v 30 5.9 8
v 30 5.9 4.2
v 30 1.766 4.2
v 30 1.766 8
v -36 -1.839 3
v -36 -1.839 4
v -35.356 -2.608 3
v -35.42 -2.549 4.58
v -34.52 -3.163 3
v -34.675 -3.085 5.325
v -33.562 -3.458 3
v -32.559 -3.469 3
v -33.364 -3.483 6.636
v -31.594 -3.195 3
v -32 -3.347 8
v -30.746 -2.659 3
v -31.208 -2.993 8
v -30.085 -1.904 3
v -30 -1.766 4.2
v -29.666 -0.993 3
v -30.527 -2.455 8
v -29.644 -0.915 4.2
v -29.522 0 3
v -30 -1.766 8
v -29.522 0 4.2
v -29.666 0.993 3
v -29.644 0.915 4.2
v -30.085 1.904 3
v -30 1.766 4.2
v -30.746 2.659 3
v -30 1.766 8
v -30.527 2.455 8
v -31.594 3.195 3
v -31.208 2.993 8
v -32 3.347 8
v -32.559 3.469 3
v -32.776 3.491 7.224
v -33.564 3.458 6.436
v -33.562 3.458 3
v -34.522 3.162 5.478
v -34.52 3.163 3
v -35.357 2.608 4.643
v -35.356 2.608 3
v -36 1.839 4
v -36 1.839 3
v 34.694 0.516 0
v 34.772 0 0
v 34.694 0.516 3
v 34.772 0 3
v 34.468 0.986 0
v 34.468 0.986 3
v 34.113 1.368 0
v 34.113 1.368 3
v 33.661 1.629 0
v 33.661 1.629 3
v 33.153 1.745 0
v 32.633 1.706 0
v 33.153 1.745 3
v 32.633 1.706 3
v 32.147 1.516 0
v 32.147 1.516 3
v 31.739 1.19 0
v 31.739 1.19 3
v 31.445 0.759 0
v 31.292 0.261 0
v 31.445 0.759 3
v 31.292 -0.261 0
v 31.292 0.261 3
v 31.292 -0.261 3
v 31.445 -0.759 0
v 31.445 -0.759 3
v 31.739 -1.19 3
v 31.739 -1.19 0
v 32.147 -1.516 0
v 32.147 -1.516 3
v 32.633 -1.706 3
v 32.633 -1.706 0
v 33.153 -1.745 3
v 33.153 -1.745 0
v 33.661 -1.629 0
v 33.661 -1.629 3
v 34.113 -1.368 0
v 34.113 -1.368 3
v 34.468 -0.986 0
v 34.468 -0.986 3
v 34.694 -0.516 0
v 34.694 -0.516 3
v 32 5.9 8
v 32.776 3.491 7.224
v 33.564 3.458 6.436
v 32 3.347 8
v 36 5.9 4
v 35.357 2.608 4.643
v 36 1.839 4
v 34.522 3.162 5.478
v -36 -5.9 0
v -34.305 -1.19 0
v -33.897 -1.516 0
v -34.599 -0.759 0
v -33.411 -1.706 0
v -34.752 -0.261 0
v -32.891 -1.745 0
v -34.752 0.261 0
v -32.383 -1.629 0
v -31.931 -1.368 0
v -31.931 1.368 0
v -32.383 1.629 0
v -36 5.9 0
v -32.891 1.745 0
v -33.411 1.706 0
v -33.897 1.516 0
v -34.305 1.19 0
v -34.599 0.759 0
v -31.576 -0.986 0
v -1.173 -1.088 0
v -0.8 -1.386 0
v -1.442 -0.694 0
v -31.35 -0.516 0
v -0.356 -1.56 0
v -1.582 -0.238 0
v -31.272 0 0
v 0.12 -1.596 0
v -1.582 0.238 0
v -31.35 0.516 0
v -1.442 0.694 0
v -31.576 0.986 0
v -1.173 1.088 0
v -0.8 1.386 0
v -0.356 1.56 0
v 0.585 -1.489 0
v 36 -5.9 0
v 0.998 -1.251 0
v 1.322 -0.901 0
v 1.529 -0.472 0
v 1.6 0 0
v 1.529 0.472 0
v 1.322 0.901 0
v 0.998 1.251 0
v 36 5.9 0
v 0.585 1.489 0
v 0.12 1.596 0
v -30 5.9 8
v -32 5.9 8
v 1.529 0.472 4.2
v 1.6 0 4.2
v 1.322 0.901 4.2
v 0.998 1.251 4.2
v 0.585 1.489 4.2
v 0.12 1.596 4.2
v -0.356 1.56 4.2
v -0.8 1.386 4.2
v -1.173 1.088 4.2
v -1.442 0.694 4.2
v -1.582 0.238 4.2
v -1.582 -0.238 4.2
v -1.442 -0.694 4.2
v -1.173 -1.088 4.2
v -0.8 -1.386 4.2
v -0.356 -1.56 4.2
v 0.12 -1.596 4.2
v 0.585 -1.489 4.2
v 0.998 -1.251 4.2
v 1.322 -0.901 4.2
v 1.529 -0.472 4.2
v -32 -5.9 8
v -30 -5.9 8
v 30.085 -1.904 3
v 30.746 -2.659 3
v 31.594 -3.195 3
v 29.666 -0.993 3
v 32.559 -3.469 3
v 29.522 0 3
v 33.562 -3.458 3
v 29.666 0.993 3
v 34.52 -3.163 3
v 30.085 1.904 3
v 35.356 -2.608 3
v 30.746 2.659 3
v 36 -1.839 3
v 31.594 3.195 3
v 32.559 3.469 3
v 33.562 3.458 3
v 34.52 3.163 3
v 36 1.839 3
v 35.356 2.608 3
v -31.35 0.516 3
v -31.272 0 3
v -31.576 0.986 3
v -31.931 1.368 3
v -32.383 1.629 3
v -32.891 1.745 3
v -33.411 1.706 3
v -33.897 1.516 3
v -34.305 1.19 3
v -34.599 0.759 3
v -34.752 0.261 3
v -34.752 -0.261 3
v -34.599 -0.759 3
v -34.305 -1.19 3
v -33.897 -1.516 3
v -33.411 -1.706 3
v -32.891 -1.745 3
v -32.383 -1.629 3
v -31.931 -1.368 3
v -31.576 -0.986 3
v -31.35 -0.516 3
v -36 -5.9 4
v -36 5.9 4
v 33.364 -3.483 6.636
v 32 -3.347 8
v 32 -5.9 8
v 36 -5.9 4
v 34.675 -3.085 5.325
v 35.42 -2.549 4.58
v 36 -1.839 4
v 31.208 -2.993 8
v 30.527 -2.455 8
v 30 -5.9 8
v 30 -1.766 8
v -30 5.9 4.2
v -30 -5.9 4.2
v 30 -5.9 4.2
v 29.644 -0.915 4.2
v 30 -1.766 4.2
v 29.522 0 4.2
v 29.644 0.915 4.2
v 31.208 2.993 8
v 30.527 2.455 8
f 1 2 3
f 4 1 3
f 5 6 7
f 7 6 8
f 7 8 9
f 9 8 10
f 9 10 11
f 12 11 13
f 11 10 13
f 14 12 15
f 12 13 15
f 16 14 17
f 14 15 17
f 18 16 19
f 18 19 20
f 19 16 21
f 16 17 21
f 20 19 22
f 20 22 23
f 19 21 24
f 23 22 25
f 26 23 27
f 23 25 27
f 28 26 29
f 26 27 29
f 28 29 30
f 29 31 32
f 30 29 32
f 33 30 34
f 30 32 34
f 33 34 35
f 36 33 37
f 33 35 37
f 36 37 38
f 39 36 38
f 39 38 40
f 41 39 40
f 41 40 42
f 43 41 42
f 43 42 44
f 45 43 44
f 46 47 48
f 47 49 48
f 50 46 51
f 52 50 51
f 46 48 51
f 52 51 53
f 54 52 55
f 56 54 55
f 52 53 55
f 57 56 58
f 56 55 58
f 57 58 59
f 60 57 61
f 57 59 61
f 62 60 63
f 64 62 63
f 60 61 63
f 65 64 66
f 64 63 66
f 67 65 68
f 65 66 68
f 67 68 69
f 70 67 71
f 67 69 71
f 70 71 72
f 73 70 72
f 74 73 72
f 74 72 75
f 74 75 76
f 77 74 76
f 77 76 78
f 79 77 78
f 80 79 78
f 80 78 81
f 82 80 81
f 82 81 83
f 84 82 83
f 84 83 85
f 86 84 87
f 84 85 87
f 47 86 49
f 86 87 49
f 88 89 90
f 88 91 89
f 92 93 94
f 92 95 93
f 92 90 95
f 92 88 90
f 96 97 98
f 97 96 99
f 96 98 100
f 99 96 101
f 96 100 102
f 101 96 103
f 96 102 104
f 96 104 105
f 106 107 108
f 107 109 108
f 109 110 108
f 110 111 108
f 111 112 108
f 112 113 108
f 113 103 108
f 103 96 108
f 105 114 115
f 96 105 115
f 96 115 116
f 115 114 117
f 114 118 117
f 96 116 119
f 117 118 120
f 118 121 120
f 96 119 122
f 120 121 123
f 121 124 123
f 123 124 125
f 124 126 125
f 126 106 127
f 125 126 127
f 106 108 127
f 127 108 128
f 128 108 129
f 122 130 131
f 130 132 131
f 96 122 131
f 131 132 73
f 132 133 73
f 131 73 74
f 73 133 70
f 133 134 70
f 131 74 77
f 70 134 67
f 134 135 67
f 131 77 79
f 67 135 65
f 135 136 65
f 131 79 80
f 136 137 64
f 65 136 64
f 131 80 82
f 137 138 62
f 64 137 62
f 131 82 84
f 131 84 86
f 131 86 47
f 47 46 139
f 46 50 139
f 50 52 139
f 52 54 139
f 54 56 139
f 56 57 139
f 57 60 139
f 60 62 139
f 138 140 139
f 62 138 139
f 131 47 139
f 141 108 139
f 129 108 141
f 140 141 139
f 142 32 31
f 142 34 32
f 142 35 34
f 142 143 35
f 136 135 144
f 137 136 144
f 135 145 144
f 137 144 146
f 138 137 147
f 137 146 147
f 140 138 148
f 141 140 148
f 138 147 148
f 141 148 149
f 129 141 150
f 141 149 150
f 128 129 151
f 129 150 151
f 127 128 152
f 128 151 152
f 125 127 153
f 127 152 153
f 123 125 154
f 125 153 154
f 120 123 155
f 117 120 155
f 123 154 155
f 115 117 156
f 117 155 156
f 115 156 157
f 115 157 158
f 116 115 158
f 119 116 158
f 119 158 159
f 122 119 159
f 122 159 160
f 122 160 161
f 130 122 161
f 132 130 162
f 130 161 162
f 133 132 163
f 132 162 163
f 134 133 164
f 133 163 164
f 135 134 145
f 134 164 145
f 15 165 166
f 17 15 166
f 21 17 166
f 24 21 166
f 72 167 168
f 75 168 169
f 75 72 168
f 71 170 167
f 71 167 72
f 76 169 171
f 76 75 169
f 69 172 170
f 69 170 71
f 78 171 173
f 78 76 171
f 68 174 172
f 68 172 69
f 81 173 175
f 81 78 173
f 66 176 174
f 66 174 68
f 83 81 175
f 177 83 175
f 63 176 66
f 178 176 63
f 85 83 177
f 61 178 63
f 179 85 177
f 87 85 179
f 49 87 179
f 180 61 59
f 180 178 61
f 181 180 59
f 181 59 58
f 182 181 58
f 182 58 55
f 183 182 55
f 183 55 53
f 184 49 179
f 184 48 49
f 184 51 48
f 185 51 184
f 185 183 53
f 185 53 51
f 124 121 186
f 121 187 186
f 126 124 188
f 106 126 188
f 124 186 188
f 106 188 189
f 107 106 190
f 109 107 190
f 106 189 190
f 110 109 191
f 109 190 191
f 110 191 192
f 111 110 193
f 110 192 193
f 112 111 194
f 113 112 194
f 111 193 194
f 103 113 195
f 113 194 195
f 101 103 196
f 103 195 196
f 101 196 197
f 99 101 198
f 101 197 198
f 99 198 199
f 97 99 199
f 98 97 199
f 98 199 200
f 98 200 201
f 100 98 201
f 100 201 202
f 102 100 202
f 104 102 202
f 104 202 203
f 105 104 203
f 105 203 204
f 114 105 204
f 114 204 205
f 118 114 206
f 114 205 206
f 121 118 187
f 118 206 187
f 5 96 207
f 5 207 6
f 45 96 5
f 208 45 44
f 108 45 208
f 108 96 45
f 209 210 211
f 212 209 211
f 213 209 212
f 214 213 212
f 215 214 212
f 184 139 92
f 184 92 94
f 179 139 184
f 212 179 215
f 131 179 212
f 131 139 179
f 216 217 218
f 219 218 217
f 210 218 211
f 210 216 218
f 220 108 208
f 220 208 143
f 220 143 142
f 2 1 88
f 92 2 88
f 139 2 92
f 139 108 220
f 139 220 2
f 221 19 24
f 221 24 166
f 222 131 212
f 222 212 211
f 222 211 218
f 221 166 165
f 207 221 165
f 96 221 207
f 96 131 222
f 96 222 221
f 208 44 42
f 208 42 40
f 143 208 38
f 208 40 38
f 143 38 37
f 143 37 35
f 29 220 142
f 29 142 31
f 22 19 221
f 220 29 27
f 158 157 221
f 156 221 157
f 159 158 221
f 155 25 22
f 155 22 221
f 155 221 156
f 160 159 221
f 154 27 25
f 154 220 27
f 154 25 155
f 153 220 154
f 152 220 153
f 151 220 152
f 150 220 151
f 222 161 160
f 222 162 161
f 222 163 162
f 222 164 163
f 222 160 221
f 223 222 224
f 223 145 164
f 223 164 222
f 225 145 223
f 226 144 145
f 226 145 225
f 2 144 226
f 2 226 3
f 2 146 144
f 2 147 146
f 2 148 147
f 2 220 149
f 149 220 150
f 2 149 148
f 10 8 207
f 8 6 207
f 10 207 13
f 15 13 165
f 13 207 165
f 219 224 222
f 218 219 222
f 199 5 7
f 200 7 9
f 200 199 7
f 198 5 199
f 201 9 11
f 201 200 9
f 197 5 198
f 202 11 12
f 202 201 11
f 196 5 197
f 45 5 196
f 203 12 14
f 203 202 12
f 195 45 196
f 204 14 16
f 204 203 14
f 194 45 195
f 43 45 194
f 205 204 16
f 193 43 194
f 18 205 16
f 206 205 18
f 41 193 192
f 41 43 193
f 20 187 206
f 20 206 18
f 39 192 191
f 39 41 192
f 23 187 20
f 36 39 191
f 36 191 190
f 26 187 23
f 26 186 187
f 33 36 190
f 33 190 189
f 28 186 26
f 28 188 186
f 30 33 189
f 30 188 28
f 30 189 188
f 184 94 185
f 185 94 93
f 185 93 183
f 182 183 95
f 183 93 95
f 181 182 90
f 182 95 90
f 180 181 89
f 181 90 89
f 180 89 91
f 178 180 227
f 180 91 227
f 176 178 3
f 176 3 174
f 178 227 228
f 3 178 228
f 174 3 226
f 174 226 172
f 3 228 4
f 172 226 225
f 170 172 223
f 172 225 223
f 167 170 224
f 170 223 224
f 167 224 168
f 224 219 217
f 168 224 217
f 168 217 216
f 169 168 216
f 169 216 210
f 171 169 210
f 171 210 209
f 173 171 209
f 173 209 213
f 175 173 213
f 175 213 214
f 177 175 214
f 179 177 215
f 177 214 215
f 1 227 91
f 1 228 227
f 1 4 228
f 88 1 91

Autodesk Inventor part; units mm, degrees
ref_plane "YZ Plane" through (0, 0, 0) normal (1, 0, 0) x (0, 1, 0)
ref_plane "XZ Plane" through (0, 0, 0) normal (0, 1, 0) x (-1, 0, 0)
ref_plane "XY Plane" through (0, 0, 0) normal (0, 0, 1) x (1, 0, 0)
sketch "Sketch1" plane through (0, 0, 0) normal (0, 0, 1) x (1, 0, 0)
  line L0 (-36, 5.9) -> (36, 5.9)
  line L1 (36, 5.9) -> (36, -5.9)
  line L2 (36, -5.9) -> (-36, -5.9)
  line L3 (-36, -5.9) -> (-36, 5.9)
  line L4 (-30, 5.9) -> (-30, -5.9)
  line L5 (30, 5.9) -> (30, -5.9)
  point P0 (0, 0)
  point P1 (0, 5.9)
  point P2 (-36, 0)
  dimension "d0" = 11.8
  dimension "d1" = 72
  dimension "d2" = 6
  dimension "d3" = 6
extrude "Extrusion1" add sketch "Sketch1" along normal blind 4.2
extrude "Extrusion2" add sketch "Sketch1" along normal blind 8 contours L0 L4 L2 L3 | L0 L1 L2 L5
sketch "Sketch2" plane through (0, 0, 8) normal (0, 0, 1) x (1, 0, 0)
  circle A0 centre (-33.022, 0) radius 3.5
  circle A1 centre (-33.022, 0) radius 1.75
  circle A2 centre (0, 0) radius 1.6
  line L0 (0, 3.25) -> (0, 0) construction
  circle A3 centre (33.022, 0) radius 3.5
  circle A4 centre (33.022, 0) radius 1.75
  dimension "d9" = 7
  dimension "d10" = 33.022
  dimension "d11" = 3.5
  dimension "d12" = 3.2
extrude "Extrusion3" cut sketch "Sketch2" against normal up to surface (8 mm away) contours A1 | A2 | A4
chamfer "Chamfer1" distance 4 angle 45 2 edges at (-36, 0, 8) (36, 0, 8)
extrude "Extrusion4" cut sketch "Sketch2" against normal blind 5 contours A0 | A3
properties part number "GA_FixaBase"
